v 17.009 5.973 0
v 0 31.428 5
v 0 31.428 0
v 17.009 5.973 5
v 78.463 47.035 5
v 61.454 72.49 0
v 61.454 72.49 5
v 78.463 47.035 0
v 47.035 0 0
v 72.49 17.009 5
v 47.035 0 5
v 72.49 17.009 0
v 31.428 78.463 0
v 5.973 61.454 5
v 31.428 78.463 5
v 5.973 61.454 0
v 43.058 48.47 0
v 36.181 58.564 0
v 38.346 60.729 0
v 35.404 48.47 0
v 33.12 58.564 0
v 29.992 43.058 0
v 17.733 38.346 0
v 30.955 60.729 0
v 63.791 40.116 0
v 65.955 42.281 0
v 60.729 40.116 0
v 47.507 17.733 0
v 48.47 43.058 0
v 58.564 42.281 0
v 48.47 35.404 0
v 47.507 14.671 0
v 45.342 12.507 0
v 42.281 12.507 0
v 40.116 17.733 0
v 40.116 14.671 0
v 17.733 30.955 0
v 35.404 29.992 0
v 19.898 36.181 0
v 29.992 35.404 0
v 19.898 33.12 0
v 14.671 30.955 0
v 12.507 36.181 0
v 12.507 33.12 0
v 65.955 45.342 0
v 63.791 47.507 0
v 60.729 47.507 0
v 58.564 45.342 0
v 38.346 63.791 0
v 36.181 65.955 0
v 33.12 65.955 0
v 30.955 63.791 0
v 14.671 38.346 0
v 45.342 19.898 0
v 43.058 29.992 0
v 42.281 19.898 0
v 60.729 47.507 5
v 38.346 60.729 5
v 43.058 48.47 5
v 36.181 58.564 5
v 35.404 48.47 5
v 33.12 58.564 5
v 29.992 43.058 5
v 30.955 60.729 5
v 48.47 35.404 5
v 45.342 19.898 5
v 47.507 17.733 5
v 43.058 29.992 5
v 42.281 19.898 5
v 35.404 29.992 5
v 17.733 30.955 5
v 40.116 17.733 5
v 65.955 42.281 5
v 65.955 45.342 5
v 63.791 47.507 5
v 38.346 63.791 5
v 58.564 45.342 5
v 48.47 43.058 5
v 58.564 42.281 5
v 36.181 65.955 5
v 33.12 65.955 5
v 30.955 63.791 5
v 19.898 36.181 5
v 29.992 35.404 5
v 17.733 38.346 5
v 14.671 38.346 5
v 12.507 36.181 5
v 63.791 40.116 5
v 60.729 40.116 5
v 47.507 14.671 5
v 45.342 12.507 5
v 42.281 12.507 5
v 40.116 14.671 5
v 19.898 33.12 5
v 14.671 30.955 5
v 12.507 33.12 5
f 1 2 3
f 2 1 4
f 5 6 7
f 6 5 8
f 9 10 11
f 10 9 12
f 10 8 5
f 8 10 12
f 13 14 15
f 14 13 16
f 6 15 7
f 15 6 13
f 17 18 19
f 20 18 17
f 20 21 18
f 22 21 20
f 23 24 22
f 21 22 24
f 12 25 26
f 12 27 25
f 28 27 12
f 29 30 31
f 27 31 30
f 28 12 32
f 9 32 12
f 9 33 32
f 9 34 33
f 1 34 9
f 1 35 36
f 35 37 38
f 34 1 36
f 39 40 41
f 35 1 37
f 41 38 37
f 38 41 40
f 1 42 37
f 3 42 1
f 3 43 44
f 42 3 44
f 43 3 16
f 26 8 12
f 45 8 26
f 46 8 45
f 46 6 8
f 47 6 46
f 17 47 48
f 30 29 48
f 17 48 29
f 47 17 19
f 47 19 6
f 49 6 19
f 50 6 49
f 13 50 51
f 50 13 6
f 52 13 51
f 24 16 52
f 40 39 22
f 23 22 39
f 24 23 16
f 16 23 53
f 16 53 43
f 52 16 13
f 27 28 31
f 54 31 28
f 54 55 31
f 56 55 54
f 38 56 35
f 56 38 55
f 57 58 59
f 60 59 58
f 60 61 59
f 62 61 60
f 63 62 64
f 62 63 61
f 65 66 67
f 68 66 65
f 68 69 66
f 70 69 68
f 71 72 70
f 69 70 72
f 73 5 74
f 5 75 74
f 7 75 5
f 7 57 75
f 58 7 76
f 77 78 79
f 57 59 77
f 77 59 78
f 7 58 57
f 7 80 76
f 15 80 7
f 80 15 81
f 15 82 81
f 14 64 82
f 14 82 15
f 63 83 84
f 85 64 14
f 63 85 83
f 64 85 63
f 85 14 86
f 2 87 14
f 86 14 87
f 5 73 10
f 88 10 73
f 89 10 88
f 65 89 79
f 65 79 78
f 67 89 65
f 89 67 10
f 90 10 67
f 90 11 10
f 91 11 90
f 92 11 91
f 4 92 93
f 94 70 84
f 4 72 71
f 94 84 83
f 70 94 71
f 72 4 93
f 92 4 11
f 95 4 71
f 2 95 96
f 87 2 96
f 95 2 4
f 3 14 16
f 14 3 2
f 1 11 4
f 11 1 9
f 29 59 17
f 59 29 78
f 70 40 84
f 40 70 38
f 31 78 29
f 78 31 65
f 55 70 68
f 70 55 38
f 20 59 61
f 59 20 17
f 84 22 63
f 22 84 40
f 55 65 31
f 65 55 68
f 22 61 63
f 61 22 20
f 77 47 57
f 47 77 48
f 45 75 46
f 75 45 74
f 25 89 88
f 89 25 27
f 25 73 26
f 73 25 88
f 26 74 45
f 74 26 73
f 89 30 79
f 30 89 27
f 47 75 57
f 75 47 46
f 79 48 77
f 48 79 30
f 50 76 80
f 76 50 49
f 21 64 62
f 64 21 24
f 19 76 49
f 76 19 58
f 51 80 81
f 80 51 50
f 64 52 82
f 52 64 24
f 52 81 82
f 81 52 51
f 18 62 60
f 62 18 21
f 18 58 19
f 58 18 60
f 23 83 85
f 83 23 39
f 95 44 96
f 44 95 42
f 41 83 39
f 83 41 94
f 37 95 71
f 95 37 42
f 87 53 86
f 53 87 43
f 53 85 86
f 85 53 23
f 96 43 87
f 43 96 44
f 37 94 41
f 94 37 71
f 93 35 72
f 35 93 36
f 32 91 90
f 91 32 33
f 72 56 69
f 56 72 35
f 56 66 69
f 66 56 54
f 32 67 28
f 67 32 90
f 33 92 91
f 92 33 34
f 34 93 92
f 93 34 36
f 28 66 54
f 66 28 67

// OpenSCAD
$fn = 32;

// ----------------------------------------------------------------------
// Polygon plate: 8-gon R40, 4 bolt windows
// ----------------------------------------------------------------------

// --- parameters (mm) ---
sides = 8;                // number of polygon sides
plate_r = 40;             // circumscribed radius of the polygon
bore_r = 10;              // centre bore radius
bolts = 4;                // number of bolt windows
ring_r = 23.48;           // bolt-circle radius
bolt_r = 4;               // bolt window radius
plate_t = 5;              // plate thickness, Z (extrusion height)

plate_d = 2 * plate_r;  // circumscribed diameter
bore_d = 2 * bore_r;  // centre bore diameter
bolt_d = 2 * bolt_r;  // bolt window diameter
ring_d = 2 * ring_r;  // bolt-circle diameter

profile = [[78.463, 47.035], [61.454, 72.49], [31.428, 78.463], [5.973, 61.454], [0, 31.428], [17.009, 5.973], [47.035, 0], [72.49, 17.009]];  // primary outline, 8 points, counter clockwise
void_1 = [[48.47, 43.058], [43.058, 48.47], [35.404, 48.47], [29.992, 43.058], [29.992, 35.404], [35.404, 29.992], [43.058, 29.992], [48.47, 35.404]];  // centre bore, 8 points
void_2 = [[65.955, 45.342], [63.791, 47.507], [60.729, 47.507], [58.564, 45.342], [58.564, 42.281], [60.729, 40.116], [63.791, 40.116], [65.955, 42.281]];  // bolt window 1, 8 points
void_3 = [[38.346, 63.791], [36.181, 65.955], [33.12, 65.955], [30.955, 63.791], [30.955, 60.729], [33.12, 58.564], [36.181, 58.564], [38.346, 60.729]];  // bolt window 2, 8 points
void_4 = [[19.898, 36.181], [17.733, 38.346], [14.671, 38.346], [12.507, 36.181], [12.507, 33.12], [14.671, 30.955], [17.733, 30.955], [19.898, 33.12]];  // bolt window 3, 8 points
void_5 = [[47.507, 17.733], [45.342, 19.898], [42.281, 19.898], [40.116, 17.733], [40.116, 14.671], [42.281, 12.507], [45.342, 12.507], [47.507, 14.671]];  // bolt window 4, 8 points

// --- the one profile operation ---
difference() {
  linear_extrude(height = plate_t) polygon(points = profile);
  translate([0, 0, -1])
    linear_extrude(height = plate_t + 2) polygon(points = void_1);
  translate([0, 0, -1])
    linear_extrude(height = plate_t + 2) polygon(points = void_2);
  translate([0, 0, -1])
    linear_extrude(height = plate_t + 2) polygon(points = void_3);
  translate([0, 0, -1])
    linear_extrude(height = plate_t + 2) polygon(points = void_4);
  translate([0, 0, -1])
    linear_extrude(height = plate_t + 2) polygon(points = void_5);
}
